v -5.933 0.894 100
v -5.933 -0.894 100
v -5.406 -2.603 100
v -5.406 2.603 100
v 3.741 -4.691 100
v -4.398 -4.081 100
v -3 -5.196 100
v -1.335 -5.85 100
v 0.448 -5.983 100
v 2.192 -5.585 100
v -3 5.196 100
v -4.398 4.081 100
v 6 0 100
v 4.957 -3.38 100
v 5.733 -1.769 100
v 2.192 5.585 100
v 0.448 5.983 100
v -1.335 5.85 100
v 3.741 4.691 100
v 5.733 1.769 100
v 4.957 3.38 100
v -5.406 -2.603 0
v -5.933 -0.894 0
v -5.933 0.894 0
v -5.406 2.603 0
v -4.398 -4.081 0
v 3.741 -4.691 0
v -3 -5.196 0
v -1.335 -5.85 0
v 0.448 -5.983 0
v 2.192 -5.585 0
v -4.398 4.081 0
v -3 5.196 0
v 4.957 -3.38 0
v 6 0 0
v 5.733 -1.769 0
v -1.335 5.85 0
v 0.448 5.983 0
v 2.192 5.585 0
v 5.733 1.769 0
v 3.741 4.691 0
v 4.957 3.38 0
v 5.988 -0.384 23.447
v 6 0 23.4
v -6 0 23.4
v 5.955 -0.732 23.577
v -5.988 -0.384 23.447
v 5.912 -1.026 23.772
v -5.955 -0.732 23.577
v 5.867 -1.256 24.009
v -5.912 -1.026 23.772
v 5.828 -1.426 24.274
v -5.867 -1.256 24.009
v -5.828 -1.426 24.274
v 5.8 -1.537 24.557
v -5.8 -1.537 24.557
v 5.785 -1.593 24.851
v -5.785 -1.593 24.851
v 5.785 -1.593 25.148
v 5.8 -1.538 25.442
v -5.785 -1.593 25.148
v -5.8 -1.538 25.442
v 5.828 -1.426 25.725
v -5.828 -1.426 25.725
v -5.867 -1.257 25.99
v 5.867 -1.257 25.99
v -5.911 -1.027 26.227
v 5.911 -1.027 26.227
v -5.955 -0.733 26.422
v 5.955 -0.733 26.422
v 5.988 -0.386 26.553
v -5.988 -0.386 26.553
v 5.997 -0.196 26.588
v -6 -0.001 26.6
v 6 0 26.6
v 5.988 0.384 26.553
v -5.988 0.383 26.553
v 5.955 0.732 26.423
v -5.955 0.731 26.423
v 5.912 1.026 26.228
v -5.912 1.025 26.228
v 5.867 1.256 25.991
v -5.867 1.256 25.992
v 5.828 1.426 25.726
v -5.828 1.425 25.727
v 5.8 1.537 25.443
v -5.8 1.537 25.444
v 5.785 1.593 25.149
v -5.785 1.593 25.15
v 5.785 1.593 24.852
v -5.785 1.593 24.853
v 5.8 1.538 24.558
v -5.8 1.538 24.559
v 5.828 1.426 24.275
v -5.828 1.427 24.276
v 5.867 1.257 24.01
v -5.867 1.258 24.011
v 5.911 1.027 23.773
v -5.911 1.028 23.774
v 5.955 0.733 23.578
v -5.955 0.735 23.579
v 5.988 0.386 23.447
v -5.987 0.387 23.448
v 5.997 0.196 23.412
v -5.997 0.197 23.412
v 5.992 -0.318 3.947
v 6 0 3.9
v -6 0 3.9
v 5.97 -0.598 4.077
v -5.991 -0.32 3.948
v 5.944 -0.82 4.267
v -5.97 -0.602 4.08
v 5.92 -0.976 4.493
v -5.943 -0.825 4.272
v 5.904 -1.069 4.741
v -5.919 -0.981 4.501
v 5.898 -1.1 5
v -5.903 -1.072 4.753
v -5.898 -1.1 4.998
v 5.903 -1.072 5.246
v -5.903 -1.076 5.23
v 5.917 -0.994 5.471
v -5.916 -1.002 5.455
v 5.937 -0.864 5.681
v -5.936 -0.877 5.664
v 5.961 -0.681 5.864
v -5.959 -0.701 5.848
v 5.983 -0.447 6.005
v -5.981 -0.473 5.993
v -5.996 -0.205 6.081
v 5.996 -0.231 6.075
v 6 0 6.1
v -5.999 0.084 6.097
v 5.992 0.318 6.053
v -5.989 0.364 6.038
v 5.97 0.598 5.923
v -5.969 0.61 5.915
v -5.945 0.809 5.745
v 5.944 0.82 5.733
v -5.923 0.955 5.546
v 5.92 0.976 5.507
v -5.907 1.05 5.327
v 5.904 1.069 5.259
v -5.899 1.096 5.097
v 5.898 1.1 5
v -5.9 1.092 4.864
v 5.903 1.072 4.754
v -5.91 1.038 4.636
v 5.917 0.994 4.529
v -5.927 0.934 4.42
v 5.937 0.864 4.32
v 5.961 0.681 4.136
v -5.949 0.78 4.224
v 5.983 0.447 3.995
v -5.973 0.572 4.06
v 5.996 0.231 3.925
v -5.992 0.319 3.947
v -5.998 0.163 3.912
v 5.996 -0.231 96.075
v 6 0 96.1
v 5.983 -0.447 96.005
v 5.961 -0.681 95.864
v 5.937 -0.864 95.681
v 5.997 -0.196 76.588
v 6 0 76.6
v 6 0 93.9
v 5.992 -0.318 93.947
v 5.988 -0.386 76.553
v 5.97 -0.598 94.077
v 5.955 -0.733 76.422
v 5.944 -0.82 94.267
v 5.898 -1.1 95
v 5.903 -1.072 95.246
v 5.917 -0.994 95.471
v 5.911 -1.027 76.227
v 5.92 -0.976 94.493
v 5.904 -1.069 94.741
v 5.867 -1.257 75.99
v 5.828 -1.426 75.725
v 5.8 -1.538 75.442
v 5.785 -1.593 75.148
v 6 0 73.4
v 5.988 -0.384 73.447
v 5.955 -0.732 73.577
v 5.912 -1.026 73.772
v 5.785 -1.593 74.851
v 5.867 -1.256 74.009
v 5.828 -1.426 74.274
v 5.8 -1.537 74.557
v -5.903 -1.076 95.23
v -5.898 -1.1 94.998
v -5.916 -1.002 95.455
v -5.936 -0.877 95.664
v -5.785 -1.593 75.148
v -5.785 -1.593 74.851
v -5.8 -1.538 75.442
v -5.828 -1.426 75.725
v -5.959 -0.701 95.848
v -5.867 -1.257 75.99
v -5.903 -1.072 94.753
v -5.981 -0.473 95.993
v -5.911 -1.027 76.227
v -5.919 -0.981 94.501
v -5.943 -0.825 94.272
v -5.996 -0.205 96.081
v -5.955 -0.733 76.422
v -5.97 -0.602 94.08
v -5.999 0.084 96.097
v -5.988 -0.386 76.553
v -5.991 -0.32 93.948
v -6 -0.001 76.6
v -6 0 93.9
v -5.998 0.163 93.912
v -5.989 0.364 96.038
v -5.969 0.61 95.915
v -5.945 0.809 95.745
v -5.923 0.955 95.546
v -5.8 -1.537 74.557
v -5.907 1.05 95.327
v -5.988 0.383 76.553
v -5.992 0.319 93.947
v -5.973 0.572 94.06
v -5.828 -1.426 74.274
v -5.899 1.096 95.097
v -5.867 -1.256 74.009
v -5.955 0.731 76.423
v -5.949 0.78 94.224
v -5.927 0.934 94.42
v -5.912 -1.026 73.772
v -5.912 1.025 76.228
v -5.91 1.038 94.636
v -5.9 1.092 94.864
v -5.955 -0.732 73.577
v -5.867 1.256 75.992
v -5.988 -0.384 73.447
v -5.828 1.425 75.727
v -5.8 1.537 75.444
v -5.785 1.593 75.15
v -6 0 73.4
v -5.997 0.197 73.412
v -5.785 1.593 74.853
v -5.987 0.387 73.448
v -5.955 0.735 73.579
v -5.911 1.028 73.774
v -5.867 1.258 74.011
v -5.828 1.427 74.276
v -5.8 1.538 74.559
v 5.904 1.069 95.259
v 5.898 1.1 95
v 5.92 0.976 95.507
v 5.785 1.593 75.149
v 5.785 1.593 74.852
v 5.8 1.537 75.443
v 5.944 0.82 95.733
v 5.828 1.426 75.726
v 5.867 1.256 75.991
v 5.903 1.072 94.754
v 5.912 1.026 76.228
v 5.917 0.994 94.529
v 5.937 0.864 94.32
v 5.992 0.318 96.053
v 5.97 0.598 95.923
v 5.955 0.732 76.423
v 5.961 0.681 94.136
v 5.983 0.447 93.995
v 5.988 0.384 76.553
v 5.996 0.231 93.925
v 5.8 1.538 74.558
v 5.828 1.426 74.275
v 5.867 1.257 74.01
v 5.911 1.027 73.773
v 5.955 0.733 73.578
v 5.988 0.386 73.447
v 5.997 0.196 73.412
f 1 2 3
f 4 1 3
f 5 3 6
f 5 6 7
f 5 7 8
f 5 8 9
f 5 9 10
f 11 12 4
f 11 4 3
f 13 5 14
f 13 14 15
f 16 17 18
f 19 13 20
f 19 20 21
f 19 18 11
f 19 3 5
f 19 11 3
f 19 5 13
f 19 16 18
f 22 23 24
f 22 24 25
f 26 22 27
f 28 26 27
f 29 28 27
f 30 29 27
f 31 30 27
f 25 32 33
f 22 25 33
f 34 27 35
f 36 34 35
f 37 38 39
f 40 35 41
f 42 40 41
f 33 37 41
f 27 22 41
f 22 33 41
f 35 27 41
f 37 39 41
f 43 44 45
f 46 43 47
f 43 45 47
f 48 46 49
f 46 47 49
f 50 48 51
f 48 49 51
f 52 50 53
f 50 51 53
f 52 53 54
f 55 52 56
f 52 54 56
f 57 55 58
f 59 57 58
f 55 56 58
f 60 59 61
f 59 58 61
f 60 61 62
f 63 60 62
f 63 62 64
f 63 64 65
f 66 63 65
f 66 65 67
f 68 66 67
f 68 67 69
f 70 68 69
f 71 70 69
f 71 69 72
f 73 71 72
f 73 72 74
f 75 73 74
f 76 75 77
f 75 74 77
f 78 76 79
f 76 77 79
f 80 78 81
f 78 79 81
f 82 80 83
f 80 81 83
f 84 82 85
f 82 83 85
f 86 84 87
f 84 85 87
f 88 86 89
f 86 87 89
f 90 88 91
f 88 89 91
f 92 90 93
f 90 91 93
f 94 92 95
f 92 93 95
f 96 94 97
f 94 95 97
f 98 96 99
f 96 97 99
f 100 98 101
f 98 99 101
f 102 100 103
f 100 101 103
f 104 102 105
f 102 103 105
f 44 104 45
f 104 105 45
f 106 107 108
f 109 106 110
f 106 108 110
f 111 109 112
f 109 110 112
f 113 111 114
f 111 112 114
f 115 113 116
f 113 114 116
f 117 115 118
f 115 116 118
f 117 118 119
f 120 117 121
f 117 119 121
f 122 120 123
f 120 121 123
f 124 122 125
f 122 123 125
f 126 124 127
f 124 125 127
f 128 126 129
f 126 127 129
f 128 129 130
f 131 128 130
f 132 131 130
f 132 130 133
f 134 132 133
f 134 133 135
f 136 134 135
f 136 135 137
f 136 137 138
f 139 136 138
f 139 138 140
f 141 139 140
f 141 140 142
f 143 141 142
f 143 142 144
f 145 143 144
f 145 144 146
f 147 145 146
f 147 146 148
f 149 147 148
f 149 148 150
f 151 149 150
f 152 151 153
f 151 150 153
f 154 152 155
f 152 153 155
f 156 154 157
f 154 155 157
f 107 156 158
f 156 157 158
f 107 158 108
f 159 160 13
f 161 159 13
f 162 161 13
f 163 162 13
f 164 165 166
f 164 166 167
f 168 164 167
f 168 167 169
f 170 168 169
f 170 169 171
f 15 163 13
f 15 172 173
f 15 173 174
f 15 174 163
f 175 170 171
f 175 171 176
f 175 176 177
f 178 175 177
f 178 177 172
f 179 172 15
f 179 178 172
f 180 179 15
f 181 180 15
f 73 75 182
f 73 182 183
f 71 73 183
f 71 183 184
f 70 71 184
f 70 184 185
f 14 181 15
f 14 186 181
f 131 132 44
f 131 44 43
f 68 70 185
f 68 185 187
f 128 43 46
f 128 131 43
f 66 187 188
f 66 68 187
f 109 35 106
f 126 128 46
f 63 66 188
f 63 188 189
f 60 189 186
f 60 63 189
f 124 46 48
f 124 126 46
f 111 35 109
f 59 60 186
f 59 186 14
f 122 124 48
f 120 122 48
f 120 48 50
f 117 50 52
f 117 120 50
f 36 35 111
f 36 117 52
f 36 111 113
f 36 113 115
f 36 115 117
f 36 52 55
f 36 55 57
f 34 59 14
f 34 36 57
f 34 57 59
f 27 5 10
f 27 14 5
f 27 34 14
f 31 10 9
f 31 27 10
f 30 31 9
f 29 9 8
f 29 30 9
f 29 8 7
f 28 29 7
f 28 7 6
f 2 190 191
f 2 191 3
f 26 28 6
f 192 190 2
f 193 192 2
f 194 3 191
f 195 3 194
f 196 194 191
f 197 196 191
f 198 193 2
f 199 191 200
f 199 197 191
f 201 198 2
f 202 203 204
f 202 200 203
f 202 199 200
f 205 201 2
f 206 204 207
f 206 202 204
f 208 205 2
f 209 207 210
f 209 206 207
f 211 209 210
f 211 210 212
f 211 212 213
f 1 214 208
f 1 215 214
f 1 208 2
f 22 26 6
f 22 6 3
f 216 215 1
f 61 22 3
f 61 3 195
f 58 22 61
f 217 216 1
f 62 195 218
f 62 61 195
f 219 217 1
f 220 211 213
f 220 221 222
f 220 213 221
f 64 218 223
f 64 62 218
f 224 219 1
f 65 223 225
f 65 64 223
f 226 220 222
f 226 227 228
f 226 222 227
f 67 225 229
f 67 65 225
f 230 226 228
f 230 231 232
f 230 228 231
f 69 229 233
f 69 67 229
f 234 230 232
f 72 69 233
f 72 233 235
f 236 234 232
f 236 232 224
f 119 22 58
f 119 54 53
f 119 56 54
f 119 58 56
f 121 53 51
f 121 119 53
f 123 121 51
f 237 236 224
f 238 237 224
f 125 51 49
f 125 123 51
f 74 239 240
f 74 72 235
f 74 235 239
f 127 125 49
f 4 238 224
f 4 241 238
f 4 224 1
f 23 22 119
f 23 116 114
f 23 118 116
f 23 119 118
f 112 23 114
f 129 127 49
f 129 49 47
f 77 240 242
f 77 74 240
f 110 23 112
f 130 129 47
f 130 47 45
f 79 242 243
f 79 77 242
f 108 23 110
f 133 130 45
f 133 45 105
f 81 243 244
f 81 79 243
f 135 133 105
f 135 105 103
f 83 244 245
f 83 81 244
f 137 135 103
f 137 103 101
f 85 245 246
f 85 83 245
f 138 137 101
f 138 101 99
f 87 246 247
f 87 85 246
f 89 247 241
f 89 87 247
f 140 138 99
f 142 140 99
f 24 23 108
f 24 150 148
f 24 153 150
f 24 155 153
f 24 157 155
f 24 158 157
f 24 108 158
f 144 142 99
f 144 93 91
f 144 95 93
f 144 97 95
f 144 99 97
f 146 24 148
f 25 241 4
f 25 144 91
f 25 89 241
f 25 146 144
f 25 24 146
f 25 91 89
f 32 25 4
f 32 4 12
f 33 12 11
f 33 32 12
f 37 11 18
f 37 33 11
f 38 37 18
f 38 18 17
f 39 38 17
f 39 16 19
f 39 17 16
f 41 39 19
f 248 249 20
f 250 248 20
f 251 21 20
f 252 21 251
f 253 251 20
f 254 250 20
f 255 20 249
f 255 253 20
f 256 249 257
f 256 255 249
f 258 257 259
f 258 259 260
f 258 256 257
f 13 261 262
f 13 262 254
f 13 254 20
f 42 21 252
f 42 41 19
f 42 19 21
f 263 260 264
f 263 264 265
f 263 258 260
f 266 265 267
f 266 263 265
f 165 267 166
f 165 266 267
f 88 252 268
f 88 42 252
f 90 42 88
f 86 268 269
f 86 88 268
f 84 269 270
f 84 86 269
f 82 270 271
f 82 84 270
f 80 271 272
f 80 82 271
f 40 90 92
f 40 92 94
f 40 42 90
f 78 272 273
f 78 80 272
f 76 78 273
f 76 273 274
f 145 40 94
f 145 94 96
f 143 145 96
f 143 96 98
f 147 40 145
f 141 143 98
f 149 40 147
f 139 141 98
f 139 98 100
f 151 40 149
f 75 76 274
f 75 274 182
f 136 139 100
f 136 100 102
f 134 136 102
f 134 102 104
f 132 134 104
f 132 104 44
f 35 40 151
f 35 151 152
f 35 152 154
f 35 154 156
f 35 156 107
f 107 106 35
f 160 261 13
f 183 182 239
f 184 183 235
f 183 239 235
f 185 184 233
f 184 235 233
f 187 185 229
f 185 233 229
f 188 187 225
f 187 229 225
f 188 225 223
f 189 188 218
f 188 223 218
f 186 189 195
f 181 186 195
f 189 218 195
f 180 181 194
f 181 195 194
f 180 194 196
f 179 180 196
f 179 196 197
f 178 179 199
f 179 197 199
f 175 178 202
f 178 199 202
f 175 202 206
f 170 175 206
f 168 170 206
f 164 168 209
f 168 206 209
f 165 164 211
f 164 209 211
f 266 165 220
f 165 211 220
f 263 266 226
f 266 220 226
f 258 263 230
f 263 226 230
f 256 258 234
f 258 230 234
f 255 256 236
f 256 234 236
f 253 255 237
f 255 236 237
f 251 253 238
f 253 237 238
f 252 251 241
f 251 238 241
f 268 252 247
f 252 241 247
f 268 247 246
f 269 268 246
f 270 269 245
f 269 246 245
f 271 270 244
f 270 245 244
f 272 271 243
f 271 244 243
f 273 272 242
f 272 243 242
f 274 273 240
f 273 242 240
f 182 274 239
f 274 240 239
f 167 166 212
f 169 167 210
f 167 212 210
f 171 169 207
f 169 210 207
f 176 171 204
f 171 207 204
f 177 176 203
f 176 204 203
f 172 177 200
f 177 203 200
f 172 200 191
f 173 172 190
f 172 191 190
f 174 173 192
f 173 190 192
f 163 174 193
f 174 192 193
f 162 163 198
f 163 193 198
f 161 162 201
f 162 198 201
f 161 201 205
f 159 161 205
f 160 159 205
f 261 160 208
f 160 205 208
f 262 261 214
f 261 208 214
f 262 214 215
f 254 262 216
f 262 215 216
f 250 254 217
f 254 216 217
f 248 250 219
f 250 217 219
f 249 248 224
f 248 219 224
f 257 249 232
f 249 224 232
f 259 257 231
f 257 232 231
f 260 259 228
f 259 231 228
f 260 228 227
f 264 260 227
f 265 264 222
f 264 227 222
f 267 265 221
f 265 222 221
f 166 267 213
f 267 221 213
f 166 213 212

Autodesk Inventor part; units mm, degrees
ref_plane "YZ Plane" through (0, 0, 0) normal (1, 0, 0) x (0, 1, 0)
ref_plane "XZ Plane" through (0, 0, 0) normal (0, 1, 0) x (-1, 0, 0)
ref_plane "XY Plane" through (0, 0, 0) normal (0, 0, 1) x (1, 0, 0)
sketch "スケッチ1" plane through (0, 0, 0) normal (0, 0, 1) x (1, 0, 0)
  circle A0 centre (0, 0) radius 6
  dimension "d0" = 12
extrude "押し出し1" add sketch "スケッチ1" along normal blind 100
sketch "スケッチ2" plane through (0, 0, 0) normal (1, 0, 0) x (0, 1, 0)
  line L0 (0, 0) -> (0, 100)
  line L1 (6, 100) -> (-6, 100) projected
  point P0 (0, 75)
  point P1 (0, 25)
  point P2 (0, 50)
  dimension "d3" = 25
  dimension "d4" = 25
hole "穴1" at (0, 0, 75) at (0, 0, 25) direction (-1, 0, 0) diameter 3.2 end through all both
sketch "スケッチ3" plane through (0, 0, 0) normal (1, 0, 0) x (0, 1, 0)
  line L0 (0, 0) -> (0, 100)
  line L1 (6, 100) -> (-6, 100) projected
  line L2 (6, 0) -> (-6, 0) projected
  point P0 (0, 95)
  point P1 (0, 5)
  dimension "d12" = 5
  dimension "d13" = 5
hole "穴2" at (0, 0, 95) at (0, 0, 5) direction (-1, 0, 0) diameter 2.2 end through all both
equation "\"d3\" = d4"
properties part number "xx_jiku_kakudo"
